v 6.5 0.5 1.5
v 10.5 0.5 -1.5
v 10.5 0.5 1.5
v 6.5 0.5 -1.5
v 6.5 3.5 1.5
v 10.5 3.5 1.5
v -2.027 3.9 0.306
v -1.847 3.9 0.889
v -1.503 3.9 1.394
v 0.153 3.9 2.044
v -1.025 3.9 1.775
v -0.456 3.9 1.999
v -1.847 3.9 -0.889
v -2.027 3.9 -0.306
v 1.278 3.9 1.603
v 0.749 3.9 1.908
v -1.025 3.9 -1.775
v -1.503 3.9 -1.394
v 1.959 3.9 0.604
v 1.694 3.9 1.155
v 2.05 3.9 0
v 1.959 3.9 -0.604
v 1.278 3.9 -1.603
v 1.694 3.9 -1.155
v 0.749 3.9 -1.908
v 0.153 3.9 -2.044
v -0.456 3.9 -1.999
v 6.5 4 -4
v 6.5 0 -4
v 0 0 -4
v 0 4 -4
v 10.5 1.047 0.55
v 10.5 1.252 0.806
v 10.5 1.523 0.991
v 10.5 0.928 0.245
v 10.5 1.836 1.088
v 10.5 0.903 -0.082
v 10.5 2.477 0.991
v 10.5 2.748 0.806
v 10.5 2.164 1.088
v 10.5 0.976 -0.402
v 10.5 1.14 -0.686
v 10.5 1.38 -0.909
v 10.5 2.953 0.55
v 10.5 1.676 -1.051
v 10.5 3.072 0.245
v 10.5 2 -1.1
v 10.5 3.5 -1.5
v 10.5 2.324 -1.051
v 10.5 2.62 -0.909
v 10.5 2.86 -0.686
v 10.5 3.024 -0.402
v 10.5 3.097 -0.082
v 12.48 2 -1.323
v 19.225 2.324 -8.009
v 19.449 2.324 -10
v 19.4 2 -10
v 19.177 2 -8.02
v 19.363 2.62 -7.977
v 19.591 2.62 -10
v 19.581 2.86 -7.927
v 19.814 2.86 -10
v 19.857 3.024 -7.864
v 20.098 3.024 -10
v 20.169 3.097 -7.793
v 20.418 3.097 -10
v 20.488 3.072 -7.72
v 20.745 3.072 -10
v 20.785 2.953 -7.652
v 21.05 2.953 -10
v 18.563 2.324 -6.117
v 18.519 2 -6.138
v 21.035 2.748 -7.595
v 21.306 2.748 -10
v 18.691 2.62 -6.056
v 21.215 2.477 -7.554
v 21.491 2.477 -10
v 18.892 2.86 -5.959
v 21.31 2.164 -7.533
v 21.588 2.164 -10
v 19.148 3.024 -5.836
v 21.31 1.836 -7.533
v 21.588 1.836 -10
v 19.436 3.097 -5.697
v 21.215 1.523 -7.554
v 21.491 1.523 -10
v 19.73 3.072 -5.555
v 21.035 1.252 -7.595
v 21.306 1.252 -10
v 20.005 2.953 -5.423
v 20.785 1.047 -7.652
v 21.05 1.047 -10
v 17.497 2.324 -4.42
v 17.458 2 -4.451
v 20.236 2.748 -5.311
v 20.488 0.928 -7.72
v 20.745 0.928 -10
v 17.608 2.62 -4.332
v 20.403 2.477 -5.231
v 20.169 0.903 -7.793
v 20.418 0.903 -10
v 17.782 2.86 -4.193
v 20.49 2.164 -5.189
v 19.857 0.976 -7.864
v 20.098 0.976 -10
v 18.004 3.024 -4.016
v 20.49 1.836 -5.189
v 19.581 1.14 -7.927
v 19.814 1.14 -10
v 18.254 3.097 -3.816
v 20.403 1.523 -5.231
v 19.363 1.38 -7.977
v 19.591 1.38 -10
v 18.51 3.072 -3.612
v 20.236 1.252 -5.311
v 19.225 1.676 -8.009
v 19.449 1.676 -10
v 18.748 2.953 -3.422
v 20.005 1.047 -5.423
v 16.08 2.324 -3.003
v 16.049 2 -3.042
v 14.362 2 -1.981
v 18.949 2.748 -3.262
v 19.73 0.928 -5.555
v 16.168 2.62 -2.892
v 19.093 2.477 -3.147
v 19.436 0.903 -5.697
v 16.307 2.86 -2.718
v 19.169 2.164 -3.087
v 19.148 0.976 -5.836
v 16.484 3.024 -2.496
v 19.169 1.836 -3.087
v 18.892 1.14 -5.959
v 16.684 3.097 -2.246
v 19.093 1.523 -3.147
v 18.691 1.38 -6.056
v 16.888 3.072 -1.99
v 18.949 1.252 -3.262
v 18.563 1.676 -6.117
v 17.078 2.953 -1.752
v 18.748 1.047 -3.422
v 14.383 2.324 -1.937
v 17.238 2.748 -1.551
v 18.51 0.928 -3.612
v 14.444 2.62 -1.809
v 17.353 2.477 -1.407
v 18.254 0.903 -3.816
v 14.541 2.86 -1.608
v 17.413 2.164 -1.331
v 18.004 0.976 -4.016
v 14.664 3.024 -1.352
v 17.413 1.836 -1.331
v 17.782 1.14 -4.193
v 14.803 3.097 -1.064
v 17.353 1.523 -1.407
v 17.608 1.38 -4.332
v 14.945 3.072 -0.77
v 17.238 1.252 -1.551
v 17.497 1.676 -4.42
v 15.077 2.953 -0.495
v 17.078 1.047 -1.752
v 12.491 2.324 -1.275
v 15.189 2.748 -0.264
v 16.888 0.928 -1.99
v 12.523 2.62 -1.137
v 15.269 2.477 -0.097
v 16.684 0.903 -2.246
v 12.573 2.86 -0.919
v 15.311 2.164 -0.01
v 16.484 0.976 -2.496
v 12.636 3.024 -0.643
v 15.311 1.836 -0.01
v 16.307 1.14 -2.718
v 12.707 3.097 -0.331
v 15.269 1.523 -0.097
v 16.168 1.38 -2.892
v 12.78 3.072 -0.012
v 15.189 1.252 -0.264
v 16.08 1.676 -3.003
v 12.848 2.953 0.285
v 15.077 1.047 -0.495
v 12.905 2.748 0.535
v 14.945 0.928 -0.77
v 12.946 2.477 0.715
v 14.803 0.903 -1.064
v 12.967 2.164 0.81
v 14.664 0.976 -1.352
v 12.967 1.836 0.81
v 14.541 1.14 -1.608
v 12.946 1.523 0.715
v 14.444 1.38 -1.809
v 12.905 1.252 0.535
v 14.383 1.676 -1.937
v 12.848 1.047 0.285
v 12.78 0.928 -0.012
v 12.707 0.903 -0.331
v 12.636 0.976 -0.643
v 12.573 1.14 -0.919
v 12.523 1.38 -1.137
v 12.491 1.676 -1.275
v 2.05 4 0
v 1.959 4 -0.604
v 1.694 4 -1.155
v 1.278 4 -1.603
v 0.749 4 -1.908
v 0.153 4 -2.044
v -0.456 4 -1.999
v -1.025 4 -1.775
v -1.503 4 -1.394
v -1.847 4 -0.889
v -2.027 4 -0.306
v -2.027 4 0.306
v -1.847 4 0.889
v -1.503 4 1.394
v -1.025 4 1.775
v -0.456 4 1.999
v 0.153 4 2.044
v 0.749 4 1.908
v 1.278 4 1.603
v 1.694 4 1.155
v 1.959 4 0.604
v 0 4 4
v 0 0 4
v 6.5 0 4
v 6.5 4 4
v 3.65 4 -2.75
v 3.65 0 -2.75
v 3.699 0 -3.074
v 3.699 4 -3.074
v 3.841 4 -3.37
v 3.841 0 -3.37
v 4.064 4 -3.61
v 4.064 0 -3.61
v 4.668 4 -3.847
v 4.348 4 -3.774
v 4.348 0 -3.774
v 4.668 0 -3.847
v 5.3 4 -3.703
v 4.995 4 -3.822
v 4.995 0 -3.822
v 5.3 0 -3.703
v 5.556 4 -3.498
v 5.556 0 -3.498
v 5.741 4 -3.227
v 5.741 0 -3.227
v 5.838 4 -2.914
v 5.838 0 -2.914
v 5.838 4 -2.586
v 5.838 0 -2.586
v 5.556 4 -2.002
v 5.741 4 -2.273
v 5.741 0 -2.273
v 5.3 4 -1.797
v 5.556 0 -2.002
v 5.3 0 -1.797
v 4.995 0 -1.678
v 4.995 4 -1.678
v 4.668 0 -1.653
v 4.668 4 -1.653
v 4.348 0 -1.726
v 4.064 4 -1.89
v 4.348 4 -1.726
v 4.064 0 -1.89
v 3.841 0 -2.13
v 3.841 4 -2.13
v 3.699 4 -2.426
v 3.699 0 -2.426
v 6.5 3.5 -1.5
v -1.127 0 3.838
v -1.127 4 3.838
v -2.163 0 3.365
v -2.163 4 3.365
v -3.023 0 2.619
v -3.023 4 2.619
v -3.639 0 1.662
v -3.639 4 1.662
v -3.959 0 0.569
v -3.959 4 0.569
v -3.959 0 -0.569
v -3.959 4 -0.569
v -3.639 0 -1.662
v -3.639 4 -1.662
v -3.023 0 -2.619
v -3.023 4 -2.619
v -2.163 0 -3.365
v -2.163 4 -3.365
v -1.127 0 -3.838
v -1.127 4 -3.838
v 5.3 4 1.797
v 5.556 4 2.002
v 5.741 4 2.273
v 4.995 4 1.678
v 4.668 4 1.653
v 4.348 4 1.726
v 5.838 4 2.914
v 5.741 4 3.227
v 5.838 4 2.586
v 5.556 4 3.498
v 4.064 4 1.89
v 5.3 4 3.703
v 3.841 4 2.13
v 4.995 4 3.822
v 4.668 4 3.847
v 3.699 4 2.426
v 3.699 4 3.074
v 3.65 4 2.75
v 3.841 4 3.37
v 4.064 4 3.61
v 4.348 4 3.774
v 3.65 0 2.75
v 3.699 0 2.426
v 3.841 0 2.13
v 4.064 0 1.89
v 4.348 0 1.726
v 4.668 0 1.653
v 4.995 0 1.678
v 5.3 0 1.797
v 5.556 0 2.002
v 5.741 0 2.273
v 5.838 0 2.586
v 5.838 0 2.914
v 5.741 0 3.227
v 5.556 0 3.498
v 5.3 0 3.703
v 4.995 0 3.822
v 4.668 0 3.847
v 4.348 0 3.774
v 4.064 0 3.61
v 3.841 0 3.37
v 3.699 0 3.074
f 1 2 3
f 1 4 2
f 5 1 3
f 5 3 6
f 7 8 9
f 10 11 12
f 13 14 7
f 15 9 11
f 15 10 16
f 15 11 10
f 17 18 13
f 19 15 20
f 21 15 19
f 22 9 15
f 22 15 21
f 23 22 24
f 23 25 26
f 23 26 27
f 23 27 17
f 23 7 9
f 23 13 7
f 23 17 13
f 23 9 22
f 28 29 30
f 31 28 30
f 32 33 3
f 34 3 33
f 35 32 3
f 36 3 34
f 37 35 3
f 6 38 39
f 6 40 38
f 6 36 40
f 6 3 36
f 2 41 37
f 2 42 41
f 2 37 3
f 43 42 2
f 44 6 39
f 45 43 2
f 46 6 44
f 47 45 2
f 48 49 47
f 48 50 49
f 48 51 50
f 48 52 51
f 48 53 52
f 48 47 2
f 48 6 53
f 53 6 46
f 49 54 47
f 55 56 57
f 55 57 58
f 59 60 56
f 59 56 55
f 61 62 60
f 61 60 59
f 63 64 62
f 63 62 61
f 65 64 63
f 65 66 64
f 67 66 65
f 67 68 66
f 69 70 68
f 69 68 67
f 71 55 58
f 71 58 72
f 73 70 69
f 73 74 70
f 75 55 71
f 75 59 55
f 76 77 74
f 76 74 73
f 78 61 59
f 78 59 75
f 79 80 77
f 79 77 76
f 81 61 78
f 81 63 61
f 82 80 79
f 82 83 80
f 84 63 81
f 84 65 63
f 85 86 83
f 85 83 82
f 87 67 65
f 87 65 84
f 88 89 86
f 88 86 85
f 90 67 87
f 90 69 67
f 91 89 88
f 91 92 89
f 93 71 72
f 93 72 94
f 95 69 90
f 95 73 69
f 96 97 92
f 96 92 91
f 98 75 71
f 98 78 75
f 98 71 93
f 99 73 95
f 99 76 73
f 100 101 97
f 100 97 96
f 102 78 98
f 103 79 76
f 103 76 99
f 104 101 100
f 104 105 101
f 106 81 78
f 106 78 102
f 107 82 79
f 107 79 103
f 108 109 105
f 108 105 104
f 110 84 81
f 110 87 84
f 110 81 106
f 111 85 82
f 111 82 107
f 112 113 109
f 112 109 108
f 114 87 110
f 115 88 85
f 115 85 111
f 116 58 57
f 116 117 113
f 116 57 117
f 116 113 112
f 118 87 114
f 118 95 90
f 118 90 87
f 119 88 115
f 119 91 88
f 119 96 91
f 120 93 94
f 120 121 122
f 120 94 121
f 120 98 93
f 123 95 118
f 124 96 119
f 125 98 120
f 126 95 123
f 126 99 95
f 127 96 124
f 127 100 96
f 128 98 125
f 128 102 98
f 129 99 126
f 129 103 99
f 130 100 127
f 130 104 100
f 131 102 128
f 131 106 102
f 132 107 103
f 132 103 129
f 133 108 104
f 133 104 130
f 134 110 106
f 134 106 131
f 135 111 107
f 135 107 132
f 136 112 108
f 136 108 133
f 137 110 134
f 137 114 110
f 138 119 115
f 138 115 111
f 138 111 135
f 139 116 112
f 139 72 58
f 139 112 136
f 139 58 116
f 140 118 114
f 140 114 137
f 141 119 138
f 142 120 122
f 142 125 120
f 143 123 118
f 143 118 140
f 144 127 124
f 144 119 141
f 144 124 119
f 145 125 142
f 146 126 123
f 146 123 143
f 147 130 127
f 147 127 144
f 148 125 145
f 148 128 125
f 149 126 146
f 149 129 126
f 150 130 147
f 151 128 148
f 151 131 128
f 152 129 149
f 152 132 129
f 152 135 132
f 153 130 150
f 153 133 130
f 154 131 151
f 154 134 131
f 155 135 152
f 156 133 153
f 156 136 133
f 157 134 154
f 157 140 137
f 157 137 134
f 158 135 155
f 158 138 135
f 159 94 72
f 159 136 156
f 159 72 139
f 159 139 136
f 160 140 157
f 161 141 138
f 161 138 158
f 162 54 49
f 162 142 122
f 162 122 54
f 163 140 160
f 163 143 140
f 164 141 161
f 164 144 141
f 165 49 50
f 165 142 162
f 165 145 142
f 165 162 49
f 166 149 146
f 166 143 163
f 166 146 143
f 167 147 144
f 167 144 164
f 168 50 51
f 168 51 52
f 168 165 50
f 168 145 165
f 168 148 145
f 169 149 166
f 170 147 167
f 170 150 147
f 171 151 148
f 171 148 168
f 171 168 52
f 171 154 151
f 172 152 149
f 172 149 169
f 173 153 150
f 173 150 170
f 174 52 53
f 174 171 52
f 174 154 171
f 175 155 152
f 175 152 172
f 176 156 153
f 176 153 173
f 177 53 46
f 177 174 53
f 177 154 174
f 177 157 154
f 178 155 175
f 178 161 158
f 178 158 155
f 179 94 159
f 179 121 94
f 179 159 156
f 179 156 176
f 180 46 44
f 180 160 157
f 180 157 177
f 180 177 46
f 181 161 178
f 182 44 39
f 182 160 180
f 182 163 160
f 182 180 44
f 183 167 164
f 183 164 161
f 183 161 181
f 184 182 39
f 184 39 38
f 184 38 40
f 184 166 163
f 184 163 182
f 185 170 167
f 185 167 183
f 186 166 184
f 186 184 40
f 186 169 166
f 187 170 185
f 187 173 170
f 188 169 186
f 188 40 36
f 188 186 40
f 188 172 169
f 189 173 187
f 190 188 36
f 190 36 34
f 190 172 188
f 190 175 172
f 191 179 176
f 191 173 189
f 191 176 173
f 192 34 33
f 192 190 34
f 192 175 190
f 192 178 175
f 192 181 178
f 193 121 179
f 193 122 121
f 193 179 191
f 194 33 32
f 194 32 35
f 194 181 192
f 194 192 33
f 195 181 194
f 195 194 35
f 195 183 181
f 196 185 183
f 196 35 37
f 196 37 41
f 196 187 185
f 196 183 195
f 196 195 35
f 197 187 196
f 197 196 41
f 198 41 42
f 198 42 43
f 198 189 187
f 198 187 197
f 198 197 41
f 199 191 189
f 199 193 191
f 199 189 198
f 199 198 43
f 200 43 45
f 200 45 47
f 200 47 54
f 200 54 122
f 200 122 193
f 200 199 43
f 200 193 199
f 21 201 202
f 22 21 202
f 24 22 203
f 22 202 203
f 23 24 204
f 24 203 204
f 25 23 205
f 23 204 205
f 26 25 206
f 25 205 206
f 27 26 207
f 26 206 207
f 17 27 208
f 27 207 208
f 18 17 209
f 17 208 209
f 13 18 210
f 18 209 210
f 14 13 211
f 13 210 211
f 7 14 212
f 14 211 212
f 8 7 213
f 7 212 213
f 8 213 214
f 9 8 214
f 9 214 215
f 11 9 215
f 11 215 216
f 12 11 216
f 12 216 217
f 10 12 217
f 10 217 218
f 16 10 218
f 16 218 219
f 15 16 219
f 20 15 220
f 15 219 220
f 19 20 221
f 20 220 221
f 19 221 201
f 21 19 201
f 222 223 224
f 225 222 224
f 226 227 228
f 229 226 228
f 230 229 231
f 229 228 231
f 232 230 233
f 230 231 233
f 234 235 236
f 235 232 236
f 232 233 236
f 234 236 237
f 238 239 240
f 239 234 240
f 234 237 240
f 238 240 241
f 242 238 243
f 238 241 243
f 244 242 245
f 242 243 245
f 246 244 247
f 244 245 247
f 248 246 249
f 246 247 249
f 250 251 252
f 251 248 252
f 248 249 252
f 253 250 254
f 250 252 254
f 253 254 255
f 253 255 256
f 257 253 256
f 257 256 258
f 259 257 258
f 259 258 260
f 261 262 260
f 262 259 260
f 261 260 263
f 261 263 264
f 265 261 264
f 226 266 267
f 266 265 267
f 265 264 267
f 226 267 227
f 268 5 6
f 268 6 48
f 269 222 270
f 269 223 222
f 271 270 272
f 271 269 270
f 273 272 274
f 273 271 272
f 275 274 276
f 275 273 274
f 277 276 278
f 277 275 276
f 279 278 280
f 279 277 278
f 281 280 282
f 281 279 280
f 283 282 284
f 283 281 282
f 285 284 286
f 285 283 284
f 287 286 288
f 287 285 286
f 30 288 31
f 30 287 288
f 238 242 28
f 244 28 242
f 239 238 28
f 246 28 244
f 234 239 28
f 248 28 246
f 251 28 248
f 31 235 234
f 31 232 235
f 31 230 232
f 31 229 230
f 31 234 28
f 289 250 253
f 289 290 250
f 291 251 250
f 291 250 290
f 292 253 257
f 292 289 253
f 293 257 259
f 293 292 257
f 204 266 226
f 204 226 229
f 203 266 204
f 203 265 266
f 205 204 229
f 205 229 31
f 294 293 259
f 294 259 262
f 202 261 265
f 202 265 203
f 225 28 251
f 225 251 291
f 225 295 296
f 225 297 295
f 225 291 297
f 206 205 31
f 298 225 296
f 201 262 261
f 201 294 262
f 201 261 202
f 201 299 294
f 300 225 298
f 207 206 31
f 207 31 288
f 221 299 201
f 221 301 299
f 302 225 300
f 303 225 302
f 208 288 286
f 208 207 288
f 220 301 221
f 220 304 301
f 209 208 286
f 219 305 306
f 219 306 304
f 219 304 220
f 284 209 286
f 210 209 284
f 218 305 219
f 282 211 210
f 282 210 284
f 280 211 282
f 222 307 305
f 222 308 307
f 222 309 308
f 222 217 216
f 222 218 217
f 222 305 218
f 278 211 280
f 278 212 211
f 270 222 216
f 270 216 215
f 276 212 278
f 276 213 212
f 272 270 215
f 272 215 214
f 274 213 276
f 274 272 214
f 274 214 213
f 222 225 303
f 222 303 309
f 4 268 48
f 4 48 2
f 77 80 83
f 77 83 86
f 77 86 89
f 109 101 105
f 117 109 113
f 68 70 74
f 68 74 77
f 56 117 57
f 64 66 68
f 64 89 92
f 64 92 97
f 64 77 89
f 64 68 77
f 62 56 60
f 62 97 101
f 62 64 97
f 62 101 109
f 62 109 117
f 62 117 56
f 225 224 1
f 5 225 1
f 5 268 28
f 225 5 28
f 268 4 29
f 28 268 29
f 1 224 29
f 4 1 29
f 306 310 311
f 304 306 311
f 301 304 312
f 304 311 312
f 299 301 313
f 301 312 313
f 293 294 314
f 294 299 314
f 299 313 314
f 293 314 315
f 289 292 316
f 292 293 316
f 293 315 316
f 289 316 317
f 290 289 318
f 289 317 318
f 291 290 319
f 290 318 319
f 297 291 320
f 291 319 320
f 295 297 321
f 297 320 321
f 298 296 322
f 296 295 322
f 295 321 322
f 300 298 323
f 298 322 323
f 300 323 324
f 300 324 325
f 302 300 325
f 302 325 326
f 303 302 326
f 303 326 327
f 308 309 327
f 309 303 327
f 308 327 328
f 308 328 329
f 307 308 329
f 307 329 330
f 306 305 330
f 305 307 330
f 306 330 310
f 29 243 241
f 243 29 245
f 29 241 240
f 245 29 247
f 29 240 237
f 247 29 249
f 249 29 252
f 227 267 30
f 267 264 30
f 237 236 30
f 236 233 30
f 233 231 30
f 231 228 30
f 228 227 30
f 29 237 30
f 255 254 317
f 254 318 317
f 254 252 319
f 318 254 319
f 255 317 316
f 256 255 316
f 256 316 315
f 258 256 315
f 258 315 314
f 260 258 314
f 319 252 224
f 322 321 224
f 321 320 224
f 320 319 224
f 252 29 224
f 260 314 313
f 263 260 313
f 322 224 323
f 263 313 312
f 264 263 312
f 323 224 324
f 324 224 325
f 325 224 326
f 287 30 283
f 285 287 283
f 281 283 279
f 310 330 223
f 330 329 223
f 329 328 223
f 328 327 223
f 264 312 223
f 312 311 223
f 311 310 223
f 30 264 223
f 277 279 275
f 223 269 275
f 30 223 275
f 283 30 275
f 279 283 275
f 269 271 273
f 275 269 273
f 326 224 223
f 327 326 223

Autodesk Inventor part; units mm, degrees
ref_plane "YZ Plane" through (0, 0, 0) normal (1, 0, 0) x (0, 1, 0)
sketch "Sketch1" plane through (0, 0, 0) normal (0, 1, 0) x (-1, 0, 0)
  circle A0 centre (0, 0) radius 4
  line L0 (0, 4) -> (-6.5, 4)
  line L1 (-6.5, 4) -> (-6.5, -4)
  line L2 (-6.5, -4) -> (0, -4)
  line L3 (0, -4) -> (0, 4)
  circle A1 centre (-4.75, 2.75) radius 1.1
  circle A2 centre (-4.75, -2.75) radius 1.1
  point P0 (-6.5, 0)
  dimension "d0" = 8
  dimension "d1" = 6.5
  dimension "d2" = 5.5
  dimension "d3" = 2.75
  dimension "d4" = 1.75
  dimension "d5" = 1.75
  dimension "d6" = 2.2
  dimension "d7" = 2.2
extrude "Extrusion1" add sketch "Sketch1" along normal blind 4
sketch "Sketch2" plane through (6.5, 0, 4) normal (1, 0, 0) x (0, 0, -1)
  line L0 (2.5, 3.5) -> (5.5, 3.5)
  line L1 (5.5, 3.5) -> (5.5, 0.5)
  line L2 (5.5, 0.5) -> (2.5, 0.5)
  line L3 (2.5, 0.5) -> (2.5, 3.5)
  line L4 (0, 4) -> (8, 4) projected
  line L5 (8, 0) -> (8, 4) projected
  point P0 (4, 0)
  dimension "d10" = 3
  dimension "d11" = 3
  dimension "d12" = 0.5
  dimension "d13" = 5.5
extrude "Extrusion2" add sketch "Sketch2" along normal blind 4
sketch "Sketch3" plane through (0, 4, 0) normal (0, 1, 0) x (1, 0, 0)
  circle A0 centre (0, 0) radius 2.05
  dimension "d16" = 4.1
extrude "Extrusion3" cut sketch "Sketch3" against normal blind 0.1
sketch "Sketch4" plane through (10.5, 0, 4) normal (1, 0, 0) x (0, 0, -1)
  circle A0 centre (4, 2) radius 1.1
  point P0 (4, 0)
  dimension "d19" = 2.2
ref_plane "Work Plane2" through (6.5, 0.5, -10) normal (0, 0, 1) x (1, 0, 0)
ref_plane "Work Plane1" through (6.5, 0.5, 0) normal (0, 0, 1) x (1, 0, 0)
sketch "Sketch5" plane through (6.5, 0.5, -10) normal (0, 0, 1) x (1, 0, 0)
  circle A0 centre (14, 1.7321) radius 1.1
  line L0 (4, 0) -> (4, 3) projected
  point P0 (-6.5, -0.5)
  dimension "d23" = 10
  dimension "d24" = 2.2
ref_plane "Work Plane3" through (6.5, 2, -1.5) normal (0, -1, 0) x (1, 0, 0)
sketch "Sketch6" plane through (6.5, 2, -1.5) normal (0, -1, 0) x (1, 0, 0)
  circle A0 centre (4, -8.5) radius 10
  line L0 (4, 3) -> (4, 0) projected
  point P0 (-6.5, 1.5)
  point P1 (4, 1.5)
  dimension "d25" = 20
  dimension "d26" = 10
revolve "Revolution1" add sketch "Sketch4" angle 90 about axis through (10.5, 0.5, -10) along (0, 1, 0)
equation "\"d3\" = 0.5 * d2"
equation "\"d5\" = d4"
equation "\"d6\" = d7"
properties part number "CapacitiveSensor"
